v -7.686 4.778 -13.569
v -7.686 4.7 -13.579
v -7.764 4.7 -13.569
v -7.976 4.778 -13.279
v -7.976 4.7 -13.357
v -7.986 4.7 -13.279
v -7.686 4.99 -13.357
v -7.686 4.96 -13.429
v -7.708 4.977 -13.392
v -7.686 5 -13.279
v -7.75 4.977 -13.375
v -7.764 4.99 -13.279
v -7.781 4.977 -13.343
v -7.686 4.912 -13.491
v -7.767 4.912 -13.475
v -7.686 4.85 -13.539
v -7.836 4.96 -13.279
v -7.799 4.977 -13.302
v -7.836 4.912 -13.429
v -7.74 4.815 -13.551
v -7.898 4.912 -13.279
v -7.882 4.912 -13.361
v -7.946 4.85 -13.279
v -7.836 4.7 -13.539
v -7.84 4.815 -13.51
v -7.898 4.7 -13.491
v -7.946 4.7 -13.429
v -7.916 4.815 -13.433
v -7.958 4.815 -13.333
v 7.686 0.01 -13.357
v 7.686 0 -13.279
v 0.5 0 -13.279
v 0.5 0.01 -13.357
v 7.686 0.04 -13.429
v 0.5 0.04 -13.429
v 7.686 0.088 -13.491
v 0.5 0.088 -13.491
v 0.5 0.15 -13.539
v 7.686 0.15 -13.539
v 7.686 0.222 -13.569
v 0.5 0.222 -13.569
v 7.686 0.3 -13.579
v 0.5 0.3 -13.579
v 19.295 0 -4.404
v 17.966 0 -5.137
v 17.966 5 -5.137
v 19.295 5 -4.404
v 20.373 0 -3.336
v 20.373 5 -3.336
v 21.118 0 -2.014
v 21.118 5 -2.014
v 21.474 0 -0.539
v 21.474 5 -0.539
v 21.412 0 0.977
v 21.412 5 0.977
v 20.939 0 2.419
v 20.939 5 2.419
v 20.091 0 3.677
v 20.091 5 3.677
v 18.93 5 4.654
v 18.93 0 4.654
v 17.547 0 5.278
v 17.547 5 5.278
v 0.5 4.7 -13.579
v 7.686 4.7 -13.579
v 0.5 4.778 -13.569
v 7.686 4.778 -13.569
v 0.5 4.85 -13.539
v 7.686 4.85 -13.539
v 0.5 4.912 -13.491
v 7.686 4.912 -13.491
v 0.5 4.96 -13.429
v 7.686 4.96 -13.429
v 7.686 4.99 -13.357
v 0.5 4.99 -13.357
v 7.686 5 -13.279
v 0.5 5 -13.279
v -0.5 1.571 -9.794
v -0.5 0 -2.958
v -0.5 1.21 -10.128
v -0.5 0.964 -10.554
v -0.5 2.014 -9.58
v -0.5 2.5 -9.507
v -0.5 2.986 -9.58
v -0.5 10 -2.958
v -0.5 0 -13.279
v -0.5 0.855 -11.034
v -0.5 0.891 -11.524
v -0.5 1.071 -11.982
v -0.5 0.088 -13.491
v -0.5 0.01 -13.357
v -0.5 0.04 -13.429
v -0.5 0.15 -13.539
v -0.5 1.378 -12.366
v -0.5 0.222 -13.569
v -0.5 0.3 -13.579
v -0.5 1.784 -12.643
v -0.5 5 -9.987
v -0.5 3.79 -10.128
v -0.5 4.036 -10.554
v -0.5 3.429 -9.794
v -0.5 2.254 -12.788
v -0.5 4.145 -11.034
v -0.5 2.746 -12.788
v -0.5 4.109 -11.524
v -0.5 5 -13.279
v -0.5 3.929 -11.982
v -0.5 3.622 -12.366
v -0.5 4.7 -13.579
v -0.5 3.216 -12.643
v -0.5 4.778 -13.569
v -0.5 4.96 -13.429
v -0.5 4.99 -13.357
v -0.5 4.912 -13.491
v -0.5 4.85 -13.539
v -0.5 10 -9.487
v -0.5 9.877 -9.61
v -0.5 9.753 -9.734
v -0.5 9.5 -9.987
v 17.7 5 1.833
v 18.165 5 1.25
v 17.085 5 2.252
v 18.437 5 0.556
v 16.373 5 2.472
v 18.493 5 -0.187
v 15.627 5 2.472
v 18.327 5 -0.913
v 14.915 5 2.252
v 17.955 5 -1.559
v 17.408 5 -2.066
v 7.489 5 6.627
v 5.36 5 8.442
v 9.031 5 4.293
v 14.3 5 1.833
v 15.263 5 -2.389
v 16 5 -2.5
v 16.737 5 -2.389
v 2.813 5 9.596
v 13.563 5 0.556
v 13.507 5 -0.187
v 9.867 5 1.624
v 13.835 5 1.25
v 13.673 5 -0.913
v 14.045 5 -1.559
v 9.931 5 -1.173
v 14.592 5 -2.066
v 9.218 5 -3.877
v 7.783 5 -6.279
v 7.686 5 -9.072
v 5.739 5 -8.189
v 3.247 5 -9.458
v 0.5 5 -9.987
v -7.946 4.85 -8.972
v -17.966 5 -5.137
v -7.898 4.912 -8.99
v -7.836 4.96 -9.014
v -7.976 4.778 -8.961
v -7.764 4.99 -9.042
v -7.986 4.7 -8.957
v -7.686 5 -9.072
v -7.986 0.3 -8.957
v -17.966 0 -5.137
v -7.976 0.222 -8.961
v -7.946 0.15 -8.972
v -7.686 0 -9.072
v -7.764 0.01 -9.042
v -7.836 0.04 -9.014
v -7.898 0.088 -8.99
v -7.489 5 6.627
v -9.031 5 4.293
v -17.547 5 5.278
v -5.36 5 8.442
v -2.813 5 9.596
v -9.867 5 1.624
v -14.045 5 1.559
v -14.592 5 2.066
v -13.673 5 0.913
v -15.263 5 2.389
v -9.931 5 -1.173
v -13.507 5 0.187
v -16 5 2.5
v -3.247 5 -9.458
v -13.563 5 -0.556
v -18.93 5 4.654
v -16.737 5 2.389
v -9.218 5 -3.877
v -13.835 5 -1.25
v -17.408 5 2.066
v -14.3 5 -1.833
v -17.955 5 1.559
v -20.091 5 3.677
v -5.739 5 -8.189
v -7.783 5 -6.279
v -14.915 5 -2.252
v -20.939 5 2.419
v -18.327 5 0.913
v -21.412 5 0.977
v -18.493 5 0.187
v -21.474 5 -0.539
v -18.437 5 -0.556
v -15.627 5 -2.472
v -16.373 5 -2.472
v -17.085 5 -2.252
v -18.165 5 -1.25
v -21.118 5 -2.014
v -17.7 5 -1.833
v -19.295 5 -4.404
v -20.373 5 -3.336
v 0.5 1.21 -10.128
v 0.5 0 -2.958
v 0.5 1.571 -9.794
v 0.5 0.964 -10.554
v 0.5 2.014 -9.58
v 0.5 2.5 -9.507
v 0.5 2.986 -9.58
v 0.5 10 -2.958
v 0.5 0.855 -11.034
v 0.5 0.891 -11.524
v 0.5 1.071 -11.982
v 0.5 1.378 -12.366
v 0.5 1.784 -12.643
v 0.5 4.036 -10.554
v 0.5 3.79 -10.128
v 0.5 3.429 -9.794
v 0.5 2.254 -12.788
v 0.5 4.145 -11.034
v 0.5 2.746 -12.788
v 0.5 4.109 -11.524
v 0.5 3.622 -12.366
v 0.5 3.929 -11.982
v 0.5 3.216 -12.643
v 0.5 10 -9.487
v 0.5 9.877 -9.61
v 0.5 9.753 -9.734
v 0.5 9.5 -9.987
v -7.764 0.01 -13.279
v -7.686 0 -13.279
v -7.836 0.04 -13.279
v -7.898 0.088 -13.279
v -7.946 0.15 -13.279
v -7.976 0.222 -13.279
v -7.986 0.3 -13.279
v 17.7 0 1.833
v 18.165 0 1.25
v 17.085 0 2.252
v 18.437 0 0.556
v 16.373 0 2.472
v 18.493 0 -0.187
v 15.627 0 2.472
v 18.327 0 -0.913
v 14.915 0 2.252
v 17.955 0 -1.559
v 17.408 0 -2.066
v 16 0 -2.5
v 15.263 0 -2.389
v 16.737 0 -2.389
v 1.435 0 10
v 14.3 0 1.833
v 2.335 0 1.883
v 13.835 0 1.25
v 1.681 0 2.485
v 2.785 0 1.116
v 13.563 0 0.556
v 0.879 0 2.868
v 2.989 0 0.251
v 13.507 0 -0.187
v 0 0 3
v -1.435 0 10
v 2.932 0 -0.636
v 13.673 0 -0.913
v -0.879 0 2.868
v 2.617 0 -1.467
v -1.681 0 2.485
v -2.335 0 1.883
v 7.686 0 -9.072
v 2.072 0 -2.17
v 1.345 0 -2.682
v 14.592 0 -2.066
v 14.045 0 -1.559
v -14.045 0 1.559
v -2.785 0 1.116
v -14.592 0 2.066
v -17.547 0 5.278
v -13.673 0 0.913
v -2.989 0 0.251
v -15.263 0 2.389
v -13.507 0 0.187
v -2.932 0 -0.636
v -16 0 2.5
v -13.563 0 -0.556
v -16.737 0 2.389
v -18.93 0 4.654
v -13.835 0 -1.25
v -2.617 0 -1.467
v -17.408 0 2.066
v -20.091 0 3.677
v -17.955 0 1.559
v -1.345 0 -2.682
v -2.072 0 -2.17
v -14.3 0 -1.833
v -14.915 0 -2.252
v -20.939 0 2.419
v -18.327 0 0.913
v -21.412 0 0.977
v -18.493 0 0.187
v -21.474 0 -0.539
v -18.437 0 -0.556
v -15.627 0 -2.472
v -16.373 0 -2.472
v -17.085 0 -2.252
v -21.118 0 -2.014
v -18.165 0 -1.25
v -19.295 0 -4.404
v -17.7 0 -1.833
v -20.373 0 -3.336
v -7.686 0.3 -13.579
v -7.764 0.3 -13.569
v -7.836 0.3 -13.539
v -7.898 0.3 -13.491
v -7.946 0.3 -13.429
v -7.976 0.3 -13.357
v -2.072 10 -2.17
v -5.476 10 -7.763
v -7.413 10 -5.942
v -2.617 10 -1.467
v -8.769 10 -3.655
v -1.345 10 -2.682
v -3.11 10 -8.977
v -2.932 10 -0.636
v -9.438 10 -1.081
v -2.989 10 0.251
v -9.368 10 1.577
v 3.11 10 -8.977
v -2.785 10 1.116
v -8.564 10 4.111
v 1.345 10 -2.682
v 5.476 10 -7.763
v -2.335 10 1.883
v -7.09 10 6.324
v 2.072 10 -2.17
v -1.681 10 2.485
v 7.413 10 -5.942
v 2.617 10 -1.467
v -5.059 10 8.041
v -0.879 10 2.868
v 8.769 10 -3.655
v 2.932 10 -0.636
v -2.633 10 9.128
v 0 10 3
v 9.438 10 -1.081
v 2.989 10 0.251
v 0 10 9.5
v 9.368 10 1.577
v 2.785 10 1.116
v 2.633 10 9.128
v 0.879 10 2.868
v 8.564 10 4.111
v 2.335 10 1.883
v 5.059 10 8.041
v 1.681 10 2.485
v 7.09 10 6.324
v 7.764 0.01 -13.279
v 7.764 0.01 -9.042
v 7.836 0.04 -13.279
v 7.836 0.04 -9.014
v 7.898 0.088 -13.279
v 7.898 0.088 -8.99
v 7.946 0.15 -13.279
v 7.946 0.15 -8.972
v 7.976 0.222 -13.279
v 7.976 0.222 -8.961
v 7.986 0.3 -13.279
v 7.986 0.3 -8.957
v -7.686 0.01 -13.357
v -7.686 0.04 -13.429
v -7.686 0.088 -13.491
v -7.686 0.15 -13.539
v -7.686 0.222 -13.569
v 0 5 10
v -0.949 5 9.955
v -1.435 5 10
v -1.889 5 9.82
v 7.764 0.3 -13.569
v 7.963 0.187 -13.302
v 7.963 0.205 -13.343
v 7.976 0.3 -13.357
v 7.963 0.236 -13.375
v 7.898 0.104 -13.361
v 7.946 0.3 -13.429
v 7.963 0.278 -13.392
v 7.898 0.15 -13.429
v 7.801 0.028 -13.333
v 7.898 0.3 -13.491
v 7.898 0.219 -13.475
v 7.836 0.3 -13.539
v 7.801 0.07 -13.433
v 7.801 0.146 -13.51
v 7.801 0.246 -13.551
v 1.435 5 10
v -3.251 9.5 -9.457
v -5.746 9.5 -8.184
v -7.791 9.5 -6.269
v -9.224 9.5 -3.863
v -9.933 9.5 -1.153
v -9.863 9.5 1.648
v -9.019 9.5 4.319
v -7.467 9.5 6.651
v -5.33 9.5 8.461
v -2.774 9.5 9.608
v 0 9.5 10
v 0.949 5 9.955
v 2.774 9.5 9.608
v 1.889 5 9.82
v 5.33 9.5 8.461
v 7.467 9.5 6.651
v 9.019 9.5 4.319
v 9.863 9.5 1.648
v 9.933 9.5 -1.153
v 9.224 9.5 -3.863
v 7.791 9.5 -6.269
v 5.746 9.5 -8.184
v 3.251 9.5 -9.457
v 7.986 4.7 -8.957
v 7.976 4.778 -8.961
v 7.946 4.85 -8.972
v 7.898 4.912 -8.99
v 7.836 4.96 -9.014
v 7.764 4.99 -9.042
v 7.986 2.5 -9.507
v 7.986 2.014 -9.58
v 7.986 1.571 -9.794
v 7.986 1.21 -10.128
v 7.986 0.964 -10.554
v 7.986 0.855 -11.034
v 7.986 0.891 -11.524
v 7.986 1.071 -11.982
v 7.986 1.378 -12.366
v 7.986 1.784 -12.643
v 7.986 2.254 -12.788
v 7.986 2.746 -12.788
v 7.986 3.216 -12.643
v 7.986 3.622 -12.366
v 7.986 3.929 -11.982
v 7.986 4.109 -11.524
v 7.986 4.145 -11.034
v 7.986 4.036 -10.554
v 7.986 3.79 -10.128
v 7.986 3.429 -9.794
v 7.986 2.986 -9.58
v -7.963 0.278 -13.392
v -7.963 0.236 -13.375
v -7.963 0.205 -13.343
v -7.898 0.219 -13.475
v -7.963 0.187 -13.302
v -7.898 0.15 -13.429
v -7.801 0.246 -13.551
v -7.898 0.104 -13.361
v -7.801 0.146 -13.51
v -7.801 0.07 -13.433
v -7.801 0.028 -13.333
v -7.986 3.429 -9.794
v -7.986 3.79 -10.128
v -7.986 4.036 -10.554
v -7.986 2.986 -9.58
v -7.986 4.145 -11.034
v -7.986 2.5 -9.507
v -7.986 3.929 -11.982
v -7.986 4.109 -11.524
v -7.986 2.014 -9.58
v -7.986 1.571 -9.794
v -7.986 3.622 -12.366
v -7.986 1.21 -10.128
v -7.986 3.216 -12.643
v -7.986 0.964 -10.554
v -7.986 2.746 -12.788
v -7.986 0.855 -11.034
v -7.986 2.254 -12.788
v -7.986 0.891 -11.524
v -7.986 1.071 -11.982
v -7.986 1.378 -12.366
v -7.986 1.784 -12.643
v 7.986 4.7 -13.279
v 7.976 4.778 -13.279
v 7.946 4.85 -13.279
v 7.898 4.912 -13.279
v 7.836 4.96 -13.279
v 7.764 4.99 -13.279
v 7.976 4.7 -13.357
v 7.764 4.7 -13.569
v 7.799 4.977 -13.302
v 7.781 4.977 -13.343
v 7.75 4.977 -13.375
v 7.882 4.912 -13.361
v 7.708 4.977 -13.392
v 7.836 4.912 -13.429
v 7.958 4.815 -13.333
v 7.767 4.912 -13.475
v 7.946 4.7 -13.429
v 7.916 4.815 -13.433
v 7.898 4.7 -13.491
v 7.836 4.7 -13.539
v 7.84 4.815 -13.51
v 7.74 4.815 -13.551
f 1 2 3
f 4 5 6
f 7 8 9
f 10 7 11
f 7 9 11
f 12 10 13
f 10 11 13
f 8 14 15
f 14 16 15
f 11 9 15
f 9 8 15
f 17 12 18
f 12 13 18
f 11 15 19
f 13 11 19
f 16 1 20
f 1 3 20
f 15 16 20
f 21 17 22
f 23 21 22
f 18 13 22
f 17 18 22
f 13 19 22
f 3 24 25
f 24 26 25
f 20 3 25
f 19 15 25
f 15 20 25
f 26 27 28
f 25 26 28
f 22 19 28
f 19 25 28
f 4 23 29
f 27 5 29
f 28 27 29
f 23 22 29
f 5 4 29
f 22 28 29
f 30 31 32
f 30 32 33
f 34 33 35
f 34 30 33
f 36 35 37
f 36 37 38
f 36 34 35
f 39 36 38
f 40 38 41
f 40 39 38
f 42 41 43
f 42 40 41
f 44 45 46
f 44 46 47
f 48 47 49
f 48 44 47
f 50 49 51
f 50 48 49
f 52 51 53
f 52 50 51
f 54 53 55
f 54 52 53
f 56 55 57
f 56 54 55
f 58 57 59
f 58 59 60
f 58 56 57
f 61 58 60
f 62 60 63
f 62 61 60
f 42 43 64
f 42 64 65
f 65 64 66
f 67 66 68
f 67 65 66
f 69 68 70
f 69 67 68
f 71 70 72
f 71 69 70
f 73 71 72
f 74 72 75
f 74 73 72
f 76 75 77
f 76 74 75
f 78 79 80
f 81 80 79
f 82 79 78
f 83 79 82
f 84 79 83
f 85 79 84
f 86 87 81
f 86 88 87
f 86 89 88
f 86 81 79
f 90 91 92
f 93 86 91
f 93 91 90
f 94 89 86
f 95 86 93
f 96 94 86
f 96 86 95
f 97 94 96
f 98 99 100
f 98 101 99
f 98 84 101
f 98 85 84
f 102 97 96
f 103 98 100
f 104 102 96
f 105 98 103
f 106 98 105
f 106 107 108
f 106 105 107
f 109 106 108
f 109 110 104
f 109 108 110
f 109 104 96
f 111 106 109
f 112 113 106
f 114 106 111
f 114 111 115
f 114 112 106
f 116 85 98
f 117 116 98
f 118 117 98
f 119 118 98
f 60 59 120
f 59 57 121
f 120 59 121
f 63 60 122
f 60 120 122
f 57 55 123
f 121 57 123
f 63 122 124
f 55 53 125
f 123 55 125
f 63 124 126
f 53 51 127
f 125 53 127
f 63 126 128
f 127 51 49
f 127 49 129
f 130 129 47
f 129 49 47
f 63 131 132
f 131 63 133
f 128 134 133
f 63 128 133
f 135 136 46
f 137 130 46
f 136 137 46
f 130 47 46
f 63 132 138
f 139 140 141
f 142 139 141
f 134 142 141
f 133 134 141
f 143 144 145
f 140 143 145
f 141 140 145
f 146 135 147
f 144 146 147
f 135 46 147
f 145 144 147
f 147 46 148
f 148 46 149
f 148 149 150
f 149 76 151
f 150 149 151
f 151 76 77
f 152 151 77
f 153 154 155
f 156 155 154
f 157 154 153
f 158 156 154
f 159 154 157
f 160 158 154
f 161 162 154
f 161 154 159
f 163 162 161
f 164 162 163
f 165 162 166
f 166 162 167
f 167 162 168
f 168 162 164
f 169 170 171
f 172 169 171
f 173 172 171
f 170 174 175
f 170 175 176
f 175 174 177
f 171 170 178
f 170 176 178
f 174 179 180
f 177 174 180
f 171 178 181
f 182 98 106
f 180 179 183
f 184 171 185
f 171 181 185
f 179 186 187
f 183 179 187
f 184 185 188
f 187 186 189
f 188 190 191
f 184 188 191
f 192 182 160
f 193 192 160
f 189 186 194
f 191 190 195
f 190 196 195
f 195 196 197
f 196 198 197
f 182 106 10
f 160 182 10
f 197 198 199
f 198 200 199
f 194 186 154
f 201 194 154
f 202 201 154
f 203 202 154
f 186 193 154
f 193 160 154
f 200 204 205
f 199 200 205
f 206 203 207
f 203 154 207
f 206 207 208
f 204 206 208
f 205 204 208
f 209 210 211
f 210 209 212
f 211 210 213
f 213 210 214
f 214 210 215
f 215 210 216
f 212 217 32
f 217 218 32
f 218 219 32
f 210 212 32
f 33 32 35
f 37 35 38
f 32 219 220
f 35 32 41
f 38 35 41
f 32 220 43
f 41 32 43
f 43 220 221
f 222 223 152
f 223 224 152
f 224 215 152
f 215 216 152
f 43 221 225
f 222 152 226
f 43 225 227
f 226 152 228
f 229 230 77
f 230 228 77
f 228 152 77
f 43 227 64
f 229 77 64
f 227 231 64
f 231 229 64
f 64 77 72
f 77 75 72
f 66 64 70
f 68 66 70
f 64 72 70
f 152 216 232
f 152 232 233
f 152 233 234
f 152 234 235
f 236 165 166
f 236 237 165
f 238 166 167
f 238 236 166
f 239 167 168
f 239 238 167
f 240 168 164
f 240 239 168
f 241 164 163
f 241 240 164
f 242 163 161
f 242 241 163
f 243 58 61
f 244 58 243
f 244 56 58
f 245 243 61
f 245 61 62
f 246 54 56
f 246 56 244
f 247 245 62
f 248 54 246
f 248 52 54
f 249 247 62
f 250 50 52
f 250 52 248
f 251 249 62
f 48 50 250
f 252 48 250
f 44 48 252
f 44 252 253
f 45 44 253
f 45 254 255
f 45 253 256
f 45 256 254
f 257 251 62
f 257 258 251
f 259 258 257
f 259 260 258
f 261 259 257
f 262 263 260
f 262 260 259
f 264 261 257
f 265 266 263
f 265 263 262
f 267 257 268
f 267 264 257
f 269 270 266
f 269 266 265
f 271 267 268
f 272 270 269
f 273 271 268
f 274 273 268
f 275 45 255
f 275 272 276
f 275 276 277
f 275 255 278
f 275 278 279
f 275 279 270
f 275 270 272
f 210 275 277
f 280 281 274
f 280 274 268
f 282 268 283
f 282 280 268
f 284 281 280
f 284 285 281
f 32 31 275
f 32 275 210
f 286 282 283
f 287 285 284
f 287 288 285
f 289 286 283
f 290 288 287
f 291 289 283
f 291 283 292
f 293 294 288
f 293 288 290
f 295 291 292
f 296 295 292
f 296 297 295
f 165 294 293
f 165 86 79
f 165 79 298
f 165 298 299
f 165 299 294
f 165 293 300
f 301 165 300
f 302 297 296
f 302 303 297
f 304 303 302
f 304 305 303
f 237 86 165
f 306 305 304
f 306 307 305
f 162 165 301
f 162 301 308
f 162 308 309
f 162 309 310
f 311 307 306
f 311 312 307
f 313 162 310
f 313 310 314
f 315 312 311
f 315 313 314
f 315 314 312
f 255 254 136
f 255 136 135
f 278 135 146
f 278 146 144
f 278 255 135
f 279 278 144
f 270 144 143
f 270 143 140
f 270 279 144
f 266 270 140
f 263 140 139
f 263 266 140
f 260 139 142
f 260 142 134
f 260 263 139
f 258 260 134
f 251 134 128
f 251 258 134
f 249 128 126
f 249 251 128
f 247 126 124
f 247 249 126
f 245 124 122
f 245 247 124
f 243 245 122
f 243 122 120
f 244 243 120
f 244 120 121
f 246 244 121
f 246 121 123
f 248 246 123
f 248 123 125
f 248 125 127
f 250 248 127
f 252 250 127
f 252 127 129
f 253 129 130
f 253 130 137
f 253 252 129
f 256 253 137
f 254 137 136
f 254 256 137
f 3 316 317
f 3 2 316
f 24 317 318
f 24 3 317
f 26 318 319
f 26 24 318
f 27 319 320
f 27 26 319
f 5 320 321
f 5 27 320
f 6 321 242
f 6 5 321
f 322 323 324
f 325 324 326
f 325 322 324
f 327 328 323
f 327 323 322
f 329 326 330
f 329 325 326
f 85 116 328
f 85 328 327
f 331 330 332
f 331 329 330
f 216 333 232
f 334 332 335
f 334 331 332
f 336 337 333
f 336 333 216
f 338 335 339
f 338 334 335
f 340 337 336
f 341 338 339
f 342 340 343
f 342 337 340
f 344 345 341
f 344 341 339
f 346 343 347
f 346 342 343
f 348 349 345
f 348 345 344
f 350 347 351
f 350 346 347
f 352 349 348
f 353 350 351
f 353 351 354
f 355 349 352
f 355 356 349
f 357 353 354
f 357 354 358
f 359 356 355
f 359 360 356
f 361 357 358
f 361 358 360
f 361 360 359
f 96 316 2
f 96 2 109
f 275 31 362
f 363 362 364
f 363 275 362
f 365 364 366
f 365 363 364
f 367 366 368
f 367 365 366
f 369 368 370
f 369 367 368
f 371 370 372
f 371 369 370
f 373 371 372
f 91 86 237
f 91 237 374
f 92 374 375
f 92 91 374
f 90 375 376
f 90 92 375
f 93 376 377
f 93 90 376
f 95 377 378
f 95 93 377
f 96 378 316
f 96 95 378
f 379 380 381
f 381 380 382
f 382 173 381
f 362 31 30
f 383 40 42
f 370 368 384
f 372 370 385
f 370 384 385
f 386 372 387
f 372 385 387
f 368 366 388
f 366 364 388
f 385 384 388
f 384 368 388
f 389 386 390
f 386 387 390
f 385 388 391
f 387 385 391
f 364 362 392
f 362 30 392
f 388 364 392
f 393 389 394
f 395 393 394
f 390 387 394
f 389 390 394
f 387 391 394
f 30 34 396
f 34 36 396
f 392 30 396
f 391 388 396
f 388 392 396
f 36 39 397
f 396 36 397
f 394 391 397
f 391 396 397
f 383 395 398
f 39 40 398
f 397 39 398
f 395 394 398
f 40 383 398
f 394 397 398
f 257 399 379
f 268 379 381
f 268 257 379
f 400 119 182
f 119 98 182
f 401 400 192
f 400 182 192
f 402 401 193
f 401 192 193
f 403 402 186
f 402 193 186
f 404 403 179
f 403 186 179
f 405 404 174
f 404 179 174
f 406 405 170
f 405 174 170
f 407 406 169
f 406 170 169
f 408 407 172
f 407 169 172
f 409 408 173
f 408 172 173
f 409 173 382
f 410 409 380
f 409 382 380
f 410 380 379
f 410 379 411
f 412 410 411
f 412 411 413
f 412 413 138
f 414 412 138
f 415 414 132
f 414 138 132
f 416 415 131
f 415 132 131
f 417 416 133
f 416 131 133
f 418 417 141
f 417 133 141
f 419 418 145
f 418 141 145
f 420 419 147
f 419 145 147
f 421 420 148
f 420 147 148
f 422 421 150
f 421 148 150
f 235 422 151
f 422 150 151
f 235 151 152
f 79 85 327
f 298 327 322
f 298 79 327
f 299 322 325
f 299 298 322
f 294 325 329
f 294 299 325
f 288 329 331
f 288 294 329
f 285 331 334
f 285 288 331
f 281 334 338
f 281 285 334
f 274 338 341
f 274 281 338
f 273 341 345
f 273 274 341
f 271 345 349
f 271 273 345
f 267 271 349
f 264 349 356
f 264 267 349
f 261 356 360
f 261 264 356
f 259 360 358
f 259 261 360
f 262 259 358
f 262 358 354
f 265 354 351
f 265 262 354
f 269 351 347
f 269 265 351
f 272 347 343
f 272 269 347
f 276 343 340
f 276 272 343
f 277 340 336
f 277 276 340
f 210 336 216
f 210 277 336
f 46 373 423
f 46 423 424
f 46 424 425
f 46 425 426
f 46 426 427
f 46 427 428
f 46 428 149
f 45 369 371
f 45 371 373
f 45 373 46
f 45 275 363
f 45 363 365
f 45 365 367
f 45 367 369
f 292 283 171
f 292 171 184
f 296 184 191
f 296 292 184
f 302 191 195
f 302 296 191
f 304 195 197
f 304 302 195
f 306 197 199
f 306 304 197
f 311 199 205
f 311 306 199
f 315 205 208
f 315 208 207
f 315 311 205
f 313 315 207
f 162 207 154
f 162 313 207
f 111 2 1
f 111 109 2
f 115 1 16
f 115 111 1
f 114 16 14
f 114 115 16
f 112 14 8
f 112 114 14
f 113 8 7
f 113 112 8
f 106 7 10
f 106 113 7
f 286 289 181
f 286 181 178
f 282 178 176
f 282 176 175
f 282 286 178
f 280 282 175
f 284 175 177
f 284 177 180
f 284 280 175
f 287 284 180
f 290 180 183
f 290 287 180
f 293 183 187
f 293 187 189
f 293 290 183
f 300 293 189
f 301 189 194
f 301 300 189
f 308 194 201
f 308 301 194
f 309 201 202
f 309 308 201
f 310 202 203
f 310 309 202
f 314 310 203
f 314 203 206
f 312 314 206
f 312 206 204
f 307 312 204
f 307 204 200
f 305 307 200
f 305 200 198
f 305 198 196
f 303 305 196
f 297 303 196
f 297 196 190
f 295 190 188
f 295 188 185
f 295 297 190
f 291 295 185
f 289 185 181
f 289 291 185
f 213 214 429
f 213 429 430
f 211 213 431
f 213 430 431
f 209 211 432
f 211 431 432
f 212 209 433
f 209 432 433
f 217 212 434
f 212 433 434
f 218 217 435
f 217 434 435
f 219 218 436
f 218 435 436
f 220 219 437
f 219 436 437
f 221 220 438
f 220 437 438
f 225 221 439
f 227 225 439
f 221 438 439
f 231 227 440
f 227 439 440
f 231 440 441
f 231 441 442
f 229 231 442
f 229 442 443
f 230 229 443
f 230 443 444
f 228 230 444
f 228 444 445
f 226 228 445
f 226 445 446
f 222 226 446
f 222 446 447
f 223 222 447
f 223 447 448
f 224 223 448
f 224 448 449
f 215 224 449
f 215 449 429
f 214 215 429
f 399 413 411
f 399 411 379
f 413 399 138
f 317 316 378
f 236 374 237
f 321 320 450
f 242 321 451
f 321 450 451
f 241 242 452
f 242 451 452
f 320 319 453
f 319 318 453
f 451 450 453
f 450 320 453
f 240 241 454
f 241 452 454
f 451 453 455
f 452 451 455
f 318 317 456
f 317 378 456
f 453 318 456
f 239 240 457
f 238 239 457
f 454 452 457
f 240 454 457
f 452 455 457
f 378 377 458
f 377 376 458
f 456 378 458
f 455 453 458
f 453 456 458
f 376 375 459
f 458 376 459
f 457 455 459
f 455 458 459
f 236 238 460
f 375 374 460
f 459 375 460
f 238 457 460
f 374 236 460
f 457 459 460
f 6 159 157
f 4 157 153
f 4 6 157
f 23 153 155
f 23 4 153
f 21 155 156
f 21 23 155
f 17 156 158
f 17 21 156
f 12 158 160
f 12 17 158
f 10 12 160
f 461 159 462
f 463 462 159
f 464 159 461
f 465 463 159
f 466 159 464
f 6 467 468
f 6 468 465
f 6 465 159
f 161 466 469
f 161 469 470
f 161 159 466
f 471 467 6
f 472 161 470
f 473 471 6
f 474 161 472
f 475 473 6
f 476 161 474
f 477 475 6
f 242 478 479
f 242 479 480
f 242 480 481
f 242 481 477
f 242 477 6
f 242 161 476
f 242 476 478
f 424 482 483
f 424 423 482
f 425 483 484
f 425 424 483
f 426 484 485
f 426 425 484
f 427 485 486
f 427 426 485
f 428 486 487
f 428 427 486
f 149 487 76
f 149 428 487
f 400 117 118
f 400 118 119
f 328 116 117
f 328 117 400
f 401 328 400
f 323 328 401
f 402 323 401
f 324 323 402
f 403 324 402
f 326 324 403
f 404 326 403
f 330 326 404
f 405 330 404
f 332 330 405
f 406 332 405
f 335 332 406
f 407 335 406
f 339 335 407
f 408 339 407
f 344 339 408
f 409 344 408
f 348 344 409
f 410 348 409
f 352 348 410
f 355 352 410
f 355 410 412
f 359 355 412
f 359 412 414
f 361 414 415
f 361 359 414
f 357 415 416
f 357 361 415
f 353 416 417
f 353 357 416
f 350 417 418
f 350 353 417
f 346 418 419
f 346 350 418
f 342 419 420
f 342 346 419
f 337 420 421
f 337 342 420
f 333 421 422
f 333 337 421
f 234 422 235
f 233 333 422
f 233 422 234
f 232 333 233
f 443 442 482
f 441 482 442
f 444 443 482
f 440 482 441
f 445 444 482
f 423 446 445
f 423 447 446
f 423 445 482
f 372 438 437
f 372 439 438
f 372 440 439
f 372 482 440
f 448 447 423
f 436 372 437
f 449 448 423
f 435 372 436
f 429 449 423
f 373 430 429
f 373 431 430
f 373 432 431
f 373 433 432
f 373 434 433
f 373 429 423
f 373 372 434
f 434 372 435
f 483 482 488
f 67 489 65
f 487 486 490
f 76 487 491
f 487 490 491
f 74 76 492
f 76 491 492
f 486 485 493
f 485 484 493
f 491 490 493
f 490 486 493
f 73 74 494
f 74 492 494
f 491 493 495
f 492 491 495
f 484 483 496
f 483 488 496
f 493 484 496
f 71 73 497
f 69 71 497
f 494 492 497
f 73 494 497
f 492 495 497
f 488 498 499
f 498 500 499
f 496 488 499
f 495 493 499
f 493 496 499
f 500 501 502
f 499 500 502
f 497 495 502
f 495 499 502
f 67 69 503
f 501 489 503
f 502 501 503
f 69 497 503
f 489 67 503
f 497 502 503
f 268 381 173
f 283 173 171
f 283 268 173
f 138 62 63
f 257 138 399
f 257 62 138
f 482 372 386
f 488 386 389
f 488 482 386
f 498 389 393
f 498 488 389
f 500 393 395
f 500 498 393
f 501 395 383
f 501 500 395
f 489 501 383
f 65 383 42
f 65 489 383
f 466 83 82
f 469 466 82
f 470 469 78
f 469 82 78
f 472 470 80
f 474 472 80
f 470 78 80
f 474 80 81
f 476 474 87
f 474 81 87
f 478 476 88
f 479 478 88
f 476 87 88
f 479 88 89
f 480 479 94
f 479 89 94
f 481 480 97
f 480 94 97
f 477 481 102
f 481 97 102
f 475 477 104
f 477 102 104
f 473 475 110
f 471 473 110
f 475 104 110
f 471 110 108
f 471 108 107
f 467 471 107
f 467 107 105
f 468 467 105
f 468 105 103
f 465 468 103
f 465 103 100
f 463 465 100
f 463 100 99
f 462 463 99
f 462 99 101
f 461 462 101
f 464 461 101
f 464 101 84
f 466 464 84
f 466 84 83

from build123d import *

# Parameters (mm, degrees)
SKETCH_1_R          = 2.5
SKETCH_1_R_2        = 3
EXTRUDE_1_DEPTH     = 5
SKETCH_2_R          = 10
SKETCH_2_R_2        = 3
EXTRUDE_2_DEPTH     = 5
FILLET_1_R          = 0.3
CHAMFER_1_SIZE      = 0.5
CUT_EXTRUDE_1_REACH = 29.325
SKETCH_3_W          = 1
SKETCH_3_H          = 13.579366256
HOLE_WIZARD_M4_1_D  = 3.3


with BuildPart() as part:
    # 草图1 → 凸台-拉伸1 (new body)
    with BuildSketch(Plane(origin=(0, 0, 0), x_dir=(1, 0, 0), z_dir=(0, 1, 0))):
        with BuildLine():
            Line((-17.966197006, 5.136542547), (-7.985903938, 8.956859846))
            Line((-7.985903938, 8.956859846), (-7.985903938, 13.579366256))
            Line((-7.985903938, 13.579366256), (7.985903938, 13.579366256))
            Line((7.985903938, 13.579366256), (7.985903938, 8.956859846))
            Line((7.985903938, 8.956859846), (17.966197006, 5.136542547))
            ThreePointArc((17.966197006, 5.136542547), (21.495547327, -0.221268111), (17.546875, -5.277989933))
            Line((17.546875, -5.277989933), (1.435216594, -10))
            Line((1.435216594, -10), (-1.435216594, -10))
            Line((-1.435216594, -10), (-17.546875, -5.277989933))
            ThreePointArc((-17.546875, -5.277989933), (-21.495547327, -0.221268111), (-17.966197006, 5.136542547))
        make_face()
        with Locations(Location((-16, 0, 0), (0, 0, 270))):
            Circle(SKETCH_1_R, mode=Mode.SUBTRACT)
        with Locations(Location((0, 0, 0), (0, 0, 270))):
            Circle(SKETCH_1_R_2, mode=Mode.SUBTRACT)
        with Locations(Location((16, 0, 0), (0, 0, 90))):
            Circle(SKETCH_1_R, mode=Mode.SUBTRACT)
    extrude(amount=EXTRUDE_1_DEPTH)

    # 草图2 → 凸台-拉伸2 (add)
    with BuildSketch(Plane(origin=(0, 5, 0), x_dir=(1, 0, 0), z_dir=(0, 1, 0))):
        with Locations(Location((0, 0, 0), (0, 0, 270))):
            Circle(SKETCH_2_R)
        with Locations(Location((0, 0, 0), (0, 0, 270))):
            Circle(SKETCH_2_R_2, mode=Mode.SUBTRACT)
    extrude(amount=EXTRUDE_2_DEPTH)

    # 圆角1
    fillet_1_edges = [part.edges().sort_by_distance(p)[0] for p in [
        (0, 0, -13.579366256),
        (7.985903938, 0, -11.268113051),
        (-7.985903938, 2.5, -13.579366256),
        (7.985903938, 2.5, -13.579366256),
        (7.985903938, 5, -11.268113051),
        (0, 5, -13.579366256),
        (-7.985903938, 5, -11.268113051),
        (-7.985903938, 0, -11.268113051),
    ]]
    fillet(fillet_1_edges, radius=FILLET_1_R)

    # 倒角1
    chamfer_1_edges = [part.edges().sort_by_distance(p)[0] for p in [
        (0, 10, -10),
    ]]
    chamfer(chamfer_1_edges, length=CHAMFER_1_SIZE)

    # 草图3 → 切除-拉伸1 (cut, up to next)
    with BuildSketch(Plane(origin=(0, 10, 0), x_dir=(1, 0, 0), z_dir=(0, 1, 0)), mode=Mode.PRIVATE) as cut_extrude_1_sk1:
        with Locations((0, 6.789683128)):
            Rectangle(SKETCH_3_W, SKETCH_3_H)
    cut_extrude_1_tool1 = extrude(cut_extrude_1_sk1.sketch, amount=-CUT_EXTRUDE_1_REACH, mode=Mode.PRIVATE) & part.part
    add(cut_extrude_1_tool1.solids().sort_by_distance((0, 10, -6.789683))[0], mode=Mode.SUBTRACT)

    # M4 螺纹孔1 (through all)
    with Locations(Plane(origin=(-7.985903938, 2.5, -11.156859846), x_dir=(0, 0, -1), z_dir=(-1, 0, 0))):
        with Locations((0, 0)):
            Hole(HOLE_WIZARD_M4_1_D / 2)


solid = part.part
